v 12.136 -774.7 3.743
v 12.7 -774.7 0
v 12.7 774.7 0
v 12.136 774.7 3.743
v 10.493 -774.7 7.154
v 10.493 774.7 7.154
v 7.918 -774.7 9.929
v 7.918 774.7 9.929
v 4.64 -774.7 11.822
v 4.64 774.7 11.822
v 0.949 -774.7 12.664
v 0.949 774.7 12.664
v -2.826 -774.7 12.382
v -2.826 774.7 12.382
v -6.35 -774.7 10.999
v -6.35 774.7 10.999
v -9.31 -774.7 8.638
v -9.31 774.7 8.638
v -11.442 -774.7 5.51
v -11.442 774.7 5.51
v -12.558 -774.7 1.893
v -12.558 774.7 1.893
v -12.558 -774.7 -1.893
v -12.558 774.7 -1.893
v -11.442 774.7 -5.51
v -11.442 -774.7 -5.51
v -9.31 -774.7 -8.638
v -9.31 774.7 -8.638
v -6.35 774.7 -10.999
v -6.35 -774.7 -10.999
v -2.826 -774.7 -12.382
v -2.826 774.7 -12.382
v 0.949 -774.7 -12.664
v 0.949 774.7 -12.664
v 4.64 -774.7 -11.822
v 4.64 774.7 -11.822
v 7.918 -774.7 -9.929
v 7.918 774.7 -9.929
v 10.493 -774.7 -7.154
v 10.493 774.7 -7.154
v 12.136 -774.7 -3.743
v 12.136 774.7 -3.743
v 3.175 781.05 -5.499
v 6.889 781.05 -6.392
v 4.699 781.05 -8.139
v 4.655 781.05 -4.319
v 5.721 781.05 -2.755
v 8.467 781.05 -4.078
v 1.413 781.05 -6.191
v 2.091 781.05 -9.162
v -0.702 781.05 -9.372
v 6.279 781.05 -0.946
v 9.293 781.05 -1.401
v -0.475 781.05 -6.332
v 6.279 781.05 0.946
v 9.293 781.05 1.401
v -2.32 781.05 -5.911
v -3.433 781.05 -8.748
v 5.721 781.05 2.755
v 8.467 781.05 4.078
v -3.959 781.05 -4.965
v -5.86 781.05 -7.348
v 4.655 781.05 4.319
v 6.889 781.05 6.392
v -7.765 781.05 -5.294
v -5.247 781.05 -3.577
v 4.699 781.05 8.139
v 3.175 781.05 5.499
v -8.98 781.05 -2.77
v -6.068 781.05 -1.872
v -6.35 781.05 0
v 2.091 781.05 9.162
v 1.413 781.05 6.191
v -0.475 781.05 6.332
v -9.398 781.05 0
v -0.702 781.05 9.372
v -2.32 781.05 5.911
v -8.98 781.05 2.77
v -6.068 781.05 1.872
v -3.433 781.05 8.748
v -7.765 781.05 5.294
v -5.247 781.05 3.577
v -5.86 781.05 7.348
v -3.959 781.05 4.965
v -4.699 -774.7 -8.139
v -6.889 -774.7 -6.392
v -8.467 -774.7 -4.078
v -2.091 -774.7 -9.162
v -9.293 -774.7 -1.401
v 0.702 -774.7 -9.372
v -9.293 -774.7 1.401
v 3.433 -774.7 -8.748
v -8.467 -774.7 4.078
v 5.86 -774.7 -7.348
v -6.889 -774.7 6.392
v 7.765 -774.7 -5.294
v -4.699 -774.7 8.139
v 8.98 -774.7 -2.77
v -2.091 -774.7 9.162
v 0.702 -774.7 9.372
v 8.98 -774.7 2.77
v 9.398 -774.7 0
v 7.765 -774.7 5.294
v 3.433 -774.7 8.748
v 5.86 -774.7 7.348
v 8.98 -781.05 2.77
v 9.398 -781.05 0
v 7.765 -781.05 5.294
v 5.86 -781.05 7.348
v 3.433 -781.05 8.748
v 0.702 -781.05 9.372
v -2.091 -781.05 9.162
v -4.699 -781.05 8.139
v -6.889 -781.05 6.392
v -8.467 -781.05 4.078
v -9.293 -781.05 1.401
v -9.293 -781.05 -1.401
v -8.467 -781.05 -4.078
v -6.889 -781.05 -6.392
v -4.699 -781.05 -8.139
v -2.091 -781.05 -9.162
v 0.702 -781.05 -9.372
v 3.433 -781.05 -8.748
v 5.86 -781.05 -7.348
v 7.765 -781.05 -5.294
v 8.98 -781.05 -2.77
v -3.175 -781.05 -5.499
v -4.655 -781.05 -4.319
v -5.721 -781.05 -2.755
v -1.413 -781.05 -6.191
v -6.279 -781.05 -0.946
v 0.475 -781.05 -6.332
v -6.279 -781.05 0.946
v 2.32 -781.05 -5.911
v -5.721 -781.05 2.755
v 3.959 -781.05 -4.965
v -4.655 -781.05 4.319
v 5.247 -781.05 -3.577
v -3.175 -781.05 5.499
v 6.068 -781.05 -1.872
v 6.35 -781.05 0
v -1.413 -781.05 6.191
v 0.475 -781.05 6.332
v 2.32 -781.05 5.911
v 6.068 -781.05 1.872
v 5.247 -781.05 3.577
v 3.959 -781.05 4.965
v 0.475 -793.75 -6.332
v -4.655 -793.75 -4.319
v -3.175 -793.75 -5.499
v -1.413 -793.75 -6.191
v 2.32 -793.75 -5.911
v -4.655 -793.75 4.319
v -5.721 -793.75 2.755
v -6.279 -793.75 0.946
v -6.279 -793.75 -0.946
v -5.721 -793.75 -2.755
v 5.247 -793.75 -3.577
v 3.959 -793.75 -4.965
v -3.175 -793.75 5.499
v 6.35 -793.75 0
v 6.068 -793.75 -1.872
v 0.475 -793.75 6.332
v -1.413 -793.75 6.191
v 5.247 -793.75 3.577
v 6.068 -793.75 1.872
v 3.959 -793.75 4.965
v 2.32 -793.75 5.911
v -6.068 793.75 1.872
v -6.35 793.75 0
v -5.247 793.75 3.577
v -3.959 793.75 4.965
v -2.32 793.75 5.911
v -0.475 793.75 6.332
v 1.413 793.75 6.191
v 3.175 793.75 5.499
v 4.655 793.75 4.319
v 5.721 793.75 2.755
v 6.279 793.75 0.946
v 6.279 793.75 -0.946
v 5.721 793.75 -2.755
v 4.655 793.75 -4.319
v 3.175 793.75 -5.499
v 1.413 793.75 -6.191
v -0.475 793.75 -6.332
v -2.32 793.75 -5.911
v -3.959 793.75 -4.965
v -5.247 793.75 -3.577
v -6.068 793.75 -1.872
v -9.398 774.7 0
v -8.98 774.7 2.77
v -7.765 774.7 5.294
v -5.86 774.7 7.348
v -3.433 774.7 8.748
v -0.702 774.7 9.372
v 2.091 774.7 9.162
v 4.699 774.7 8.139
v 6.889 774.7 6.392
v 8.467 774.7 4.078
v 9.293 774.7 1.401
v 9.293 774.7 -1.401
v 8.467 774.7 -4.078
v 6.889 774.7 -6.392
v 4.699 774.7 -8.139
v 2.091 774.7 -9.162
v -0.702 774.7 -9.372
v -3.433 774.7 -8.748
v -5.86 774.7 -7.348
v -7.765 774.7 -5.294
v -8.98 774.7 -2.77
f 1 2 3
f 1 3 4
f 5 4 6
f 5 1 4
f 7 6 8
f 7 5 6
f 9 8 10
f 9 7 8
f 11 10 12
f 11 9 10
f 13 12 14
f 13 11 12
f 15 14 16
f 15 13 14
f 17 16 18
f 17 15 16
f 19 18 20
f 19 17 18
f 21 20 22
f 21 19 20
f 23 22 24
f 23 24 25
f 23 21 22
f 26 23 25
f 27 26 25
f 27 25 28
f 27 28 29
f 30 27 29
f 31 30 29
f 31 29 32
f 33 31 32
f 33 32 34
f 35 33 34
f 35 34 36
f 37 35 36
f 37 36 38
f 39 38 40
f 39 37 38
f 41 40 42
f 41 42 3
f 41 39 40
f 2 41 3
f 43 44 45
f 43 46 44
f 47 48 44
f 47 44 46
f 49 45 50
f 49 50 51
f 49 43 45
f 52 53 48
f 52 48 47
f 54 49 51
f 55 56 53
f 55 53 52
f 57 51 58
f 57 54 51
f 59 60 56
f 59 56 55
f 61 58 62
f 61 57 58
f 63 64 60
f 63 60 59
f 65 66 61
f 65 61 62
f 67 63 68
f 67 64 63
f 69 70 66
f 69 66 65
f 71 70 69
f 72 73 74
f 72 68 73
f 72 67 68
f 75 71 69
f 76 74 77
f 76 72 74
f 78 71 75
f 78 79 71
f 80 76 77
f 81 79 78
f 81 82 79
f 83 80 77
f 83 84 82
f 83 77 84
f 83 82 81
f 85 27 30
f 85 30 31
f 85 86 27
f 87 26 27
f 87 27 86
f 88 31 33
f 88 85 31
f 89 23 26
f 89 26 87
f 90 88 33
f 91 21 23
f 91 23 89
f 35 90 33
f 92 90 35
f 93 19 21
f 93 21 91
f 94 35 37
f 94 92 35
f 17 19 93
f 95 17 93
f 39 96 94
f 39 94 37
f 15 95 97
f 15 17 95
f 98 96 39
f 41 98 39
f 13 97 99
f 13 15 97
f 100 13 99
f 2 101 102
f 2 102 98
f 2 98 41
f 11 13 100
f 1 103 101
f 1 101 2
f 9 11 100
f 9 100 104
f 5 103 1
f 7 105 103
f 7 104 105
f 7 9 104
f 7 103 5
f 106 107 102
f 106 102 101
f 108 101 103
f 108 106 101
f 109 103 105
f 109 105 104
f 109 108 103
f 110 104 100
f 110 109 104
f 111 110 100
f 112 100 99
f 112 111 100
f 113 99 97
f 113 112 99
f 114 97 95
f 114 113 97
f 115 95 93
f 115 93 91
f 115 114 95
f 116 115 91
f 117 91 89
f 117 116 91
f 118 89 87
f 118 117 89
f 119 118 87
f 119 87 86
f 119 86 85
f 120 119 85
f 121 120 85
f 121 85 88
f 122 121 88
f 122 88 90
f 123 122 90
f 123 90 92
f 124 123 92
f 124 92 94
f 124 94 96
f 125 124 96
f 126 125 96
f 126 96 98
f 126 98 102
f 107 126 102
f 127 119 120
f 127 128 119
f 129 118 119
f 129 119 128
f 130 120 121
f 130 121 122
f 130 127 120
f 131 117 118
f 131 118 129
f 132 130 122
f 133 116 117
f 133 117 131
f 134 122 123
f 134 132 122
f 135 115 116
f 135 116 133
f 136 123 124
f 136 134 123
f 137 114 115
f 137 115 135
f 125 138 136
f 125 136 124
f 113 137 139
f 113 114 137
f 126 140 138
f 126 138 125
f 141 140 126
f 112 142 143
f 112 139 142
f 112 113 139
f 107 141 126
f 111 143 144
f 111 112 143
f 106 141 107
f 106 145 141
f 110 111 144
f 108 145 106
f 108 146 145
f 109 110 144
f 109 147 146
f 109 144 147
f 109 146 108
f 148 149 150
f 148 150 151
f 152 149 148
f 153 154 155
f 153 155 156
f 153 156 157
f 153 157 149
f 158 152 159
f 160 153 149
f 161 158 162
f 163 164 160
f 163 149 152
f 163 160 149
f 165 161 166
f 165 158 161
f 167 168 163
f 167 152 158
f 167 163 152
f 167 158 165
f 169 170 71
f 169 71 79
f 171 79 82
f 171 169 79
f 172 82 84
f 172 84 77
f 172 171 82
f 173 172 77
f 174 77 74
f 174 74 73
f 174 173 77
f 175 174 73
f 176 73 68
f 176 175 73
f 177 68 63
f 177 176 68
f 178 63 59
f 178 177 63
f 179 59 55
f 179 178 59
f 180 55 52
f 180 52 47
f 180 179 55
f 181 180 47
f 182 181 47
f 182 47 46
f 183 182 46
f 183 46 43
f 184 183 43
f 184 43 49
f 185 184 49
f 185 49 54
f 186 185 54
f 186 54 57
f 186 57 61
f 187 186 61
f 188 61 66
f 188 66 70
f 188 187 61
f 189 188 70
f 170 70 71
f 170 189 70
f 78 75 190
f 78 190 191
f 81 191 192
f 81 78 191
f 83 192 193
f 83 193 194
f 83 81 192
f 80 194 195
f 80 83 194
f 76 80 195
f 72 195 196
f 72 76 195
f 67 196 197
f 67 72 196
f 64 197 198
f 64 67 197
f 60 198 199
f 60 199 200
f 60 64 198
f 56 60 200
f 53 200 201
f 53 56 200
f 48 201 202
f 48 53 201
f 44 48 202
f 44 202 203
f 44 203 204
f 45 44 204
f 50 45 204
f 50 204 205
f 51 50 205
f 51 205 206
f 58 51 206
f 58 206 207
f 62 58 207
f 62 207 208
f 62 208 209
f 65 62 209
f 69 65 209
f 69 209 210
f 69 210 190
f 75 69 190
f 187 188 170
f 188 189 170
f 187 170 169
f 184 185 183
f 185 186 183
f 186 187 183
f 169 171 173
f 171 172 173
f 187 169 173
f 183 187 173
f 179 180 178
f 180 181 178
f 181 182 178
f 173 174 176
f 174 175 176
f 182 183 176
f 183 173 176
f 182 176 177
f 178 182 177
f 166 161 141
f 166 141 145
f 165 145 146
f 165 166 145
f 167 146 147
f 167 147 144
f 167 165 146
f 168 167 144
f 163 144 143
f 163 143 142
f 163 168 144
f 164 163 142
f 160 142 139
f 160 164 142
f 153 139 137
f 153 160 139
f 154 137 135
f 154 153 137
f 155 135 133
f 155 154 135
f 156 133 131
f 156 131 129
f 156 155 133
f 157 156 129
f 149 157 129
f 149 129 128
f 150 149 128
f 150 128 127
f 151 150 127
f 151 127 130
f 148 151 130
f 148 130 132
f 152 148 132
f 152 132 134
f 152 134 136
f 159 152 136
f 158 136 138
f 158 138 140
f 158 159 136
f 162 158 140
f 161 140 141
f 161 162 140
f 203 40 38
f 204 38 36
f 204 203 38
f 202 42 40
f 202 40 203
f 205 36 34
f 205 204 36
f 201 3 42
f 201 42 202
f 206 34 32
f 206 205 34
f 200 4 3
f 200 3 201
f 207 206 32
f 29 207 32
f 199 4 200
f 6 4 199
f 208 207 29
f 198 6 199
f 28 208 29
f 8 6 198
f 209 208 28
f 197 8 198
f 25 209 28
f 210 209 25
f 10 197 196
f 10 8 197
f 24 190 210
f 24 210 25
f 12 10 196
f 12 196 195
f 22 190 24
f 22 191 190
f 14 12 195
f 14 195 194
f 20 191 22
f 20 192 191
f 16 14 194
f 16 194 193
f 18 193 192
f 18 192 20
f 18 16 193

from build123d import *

# Parameters (mm, degrees)
F0_R     = 12.7
F1_DEPTH = 793.75
F2_R     = 12.7
F2_R_2   = 9.398
F3_DEPTH = 19.05
F4_R     = 12.7
F4_R_2   = 9.398
F5_DEPTH = 19.05
F6_R     = 9.398
F6_R_2   = 6.35
F7_DEPTH = 12.7
F8_R     = 9.398
F8_R_2   = 6.35
F9_DEPTH = 12.7


with BuildPart() as f1:
    # F0 (on Front) → F1 (new body, symmetric)
    with BuildSketch(Plane.XZ):
        Circle(F0_R)
    extrude(amount=F1_DEPTH, both=True)

    # F2 (on face) → F3 (cut)
    with BuildSketch(Plane(origin=(0, 793.75, 0), x_dir=(-1, 0, 0), z_dir=(0, 1, 0))):
        Circle(F2_R)
        Circle(F2_R_2, mode=Mode.SUBTRACT)
    extrude(amount=-F3_DEPTH, mode=Mode.SUBTRACT)

    # F4 (on face) → F5 (cut)
    with BuildSketch(Plane.XZ.offset(793.75)):
        Circle(F4_R)
        Circle(F4_R_2, mode=Mode.SUBTRACT)
    extrude(amount=-F5_DEPTH, mode=Mode.SUBTRACT)

    # F6 (on face) → F7 (cut)
    with BuildSketch(Plane.XZ.offset(793.75)):
        Circle(F6_R)
        Circle(F6_R_2, mode=Mode.SUBTRACT)
    extrude(amount=-F7_DEPTH, mode=Mode.SUBTRACT)

    # F8 (on face) → F9 (cut)
    with BuildSketch(Plane(origin=(0, 793.75, 0), x_dir=(-1, 0, 0), z_dir=(0, 1, 0))):
        Circle(F8_R)
        Circle(F8_R_2, mode=Mode.SUBTRACT)
    extrude(amount=-F9_DEPTH, mode=Mode.SUBTRACT)


solid = f1.part
